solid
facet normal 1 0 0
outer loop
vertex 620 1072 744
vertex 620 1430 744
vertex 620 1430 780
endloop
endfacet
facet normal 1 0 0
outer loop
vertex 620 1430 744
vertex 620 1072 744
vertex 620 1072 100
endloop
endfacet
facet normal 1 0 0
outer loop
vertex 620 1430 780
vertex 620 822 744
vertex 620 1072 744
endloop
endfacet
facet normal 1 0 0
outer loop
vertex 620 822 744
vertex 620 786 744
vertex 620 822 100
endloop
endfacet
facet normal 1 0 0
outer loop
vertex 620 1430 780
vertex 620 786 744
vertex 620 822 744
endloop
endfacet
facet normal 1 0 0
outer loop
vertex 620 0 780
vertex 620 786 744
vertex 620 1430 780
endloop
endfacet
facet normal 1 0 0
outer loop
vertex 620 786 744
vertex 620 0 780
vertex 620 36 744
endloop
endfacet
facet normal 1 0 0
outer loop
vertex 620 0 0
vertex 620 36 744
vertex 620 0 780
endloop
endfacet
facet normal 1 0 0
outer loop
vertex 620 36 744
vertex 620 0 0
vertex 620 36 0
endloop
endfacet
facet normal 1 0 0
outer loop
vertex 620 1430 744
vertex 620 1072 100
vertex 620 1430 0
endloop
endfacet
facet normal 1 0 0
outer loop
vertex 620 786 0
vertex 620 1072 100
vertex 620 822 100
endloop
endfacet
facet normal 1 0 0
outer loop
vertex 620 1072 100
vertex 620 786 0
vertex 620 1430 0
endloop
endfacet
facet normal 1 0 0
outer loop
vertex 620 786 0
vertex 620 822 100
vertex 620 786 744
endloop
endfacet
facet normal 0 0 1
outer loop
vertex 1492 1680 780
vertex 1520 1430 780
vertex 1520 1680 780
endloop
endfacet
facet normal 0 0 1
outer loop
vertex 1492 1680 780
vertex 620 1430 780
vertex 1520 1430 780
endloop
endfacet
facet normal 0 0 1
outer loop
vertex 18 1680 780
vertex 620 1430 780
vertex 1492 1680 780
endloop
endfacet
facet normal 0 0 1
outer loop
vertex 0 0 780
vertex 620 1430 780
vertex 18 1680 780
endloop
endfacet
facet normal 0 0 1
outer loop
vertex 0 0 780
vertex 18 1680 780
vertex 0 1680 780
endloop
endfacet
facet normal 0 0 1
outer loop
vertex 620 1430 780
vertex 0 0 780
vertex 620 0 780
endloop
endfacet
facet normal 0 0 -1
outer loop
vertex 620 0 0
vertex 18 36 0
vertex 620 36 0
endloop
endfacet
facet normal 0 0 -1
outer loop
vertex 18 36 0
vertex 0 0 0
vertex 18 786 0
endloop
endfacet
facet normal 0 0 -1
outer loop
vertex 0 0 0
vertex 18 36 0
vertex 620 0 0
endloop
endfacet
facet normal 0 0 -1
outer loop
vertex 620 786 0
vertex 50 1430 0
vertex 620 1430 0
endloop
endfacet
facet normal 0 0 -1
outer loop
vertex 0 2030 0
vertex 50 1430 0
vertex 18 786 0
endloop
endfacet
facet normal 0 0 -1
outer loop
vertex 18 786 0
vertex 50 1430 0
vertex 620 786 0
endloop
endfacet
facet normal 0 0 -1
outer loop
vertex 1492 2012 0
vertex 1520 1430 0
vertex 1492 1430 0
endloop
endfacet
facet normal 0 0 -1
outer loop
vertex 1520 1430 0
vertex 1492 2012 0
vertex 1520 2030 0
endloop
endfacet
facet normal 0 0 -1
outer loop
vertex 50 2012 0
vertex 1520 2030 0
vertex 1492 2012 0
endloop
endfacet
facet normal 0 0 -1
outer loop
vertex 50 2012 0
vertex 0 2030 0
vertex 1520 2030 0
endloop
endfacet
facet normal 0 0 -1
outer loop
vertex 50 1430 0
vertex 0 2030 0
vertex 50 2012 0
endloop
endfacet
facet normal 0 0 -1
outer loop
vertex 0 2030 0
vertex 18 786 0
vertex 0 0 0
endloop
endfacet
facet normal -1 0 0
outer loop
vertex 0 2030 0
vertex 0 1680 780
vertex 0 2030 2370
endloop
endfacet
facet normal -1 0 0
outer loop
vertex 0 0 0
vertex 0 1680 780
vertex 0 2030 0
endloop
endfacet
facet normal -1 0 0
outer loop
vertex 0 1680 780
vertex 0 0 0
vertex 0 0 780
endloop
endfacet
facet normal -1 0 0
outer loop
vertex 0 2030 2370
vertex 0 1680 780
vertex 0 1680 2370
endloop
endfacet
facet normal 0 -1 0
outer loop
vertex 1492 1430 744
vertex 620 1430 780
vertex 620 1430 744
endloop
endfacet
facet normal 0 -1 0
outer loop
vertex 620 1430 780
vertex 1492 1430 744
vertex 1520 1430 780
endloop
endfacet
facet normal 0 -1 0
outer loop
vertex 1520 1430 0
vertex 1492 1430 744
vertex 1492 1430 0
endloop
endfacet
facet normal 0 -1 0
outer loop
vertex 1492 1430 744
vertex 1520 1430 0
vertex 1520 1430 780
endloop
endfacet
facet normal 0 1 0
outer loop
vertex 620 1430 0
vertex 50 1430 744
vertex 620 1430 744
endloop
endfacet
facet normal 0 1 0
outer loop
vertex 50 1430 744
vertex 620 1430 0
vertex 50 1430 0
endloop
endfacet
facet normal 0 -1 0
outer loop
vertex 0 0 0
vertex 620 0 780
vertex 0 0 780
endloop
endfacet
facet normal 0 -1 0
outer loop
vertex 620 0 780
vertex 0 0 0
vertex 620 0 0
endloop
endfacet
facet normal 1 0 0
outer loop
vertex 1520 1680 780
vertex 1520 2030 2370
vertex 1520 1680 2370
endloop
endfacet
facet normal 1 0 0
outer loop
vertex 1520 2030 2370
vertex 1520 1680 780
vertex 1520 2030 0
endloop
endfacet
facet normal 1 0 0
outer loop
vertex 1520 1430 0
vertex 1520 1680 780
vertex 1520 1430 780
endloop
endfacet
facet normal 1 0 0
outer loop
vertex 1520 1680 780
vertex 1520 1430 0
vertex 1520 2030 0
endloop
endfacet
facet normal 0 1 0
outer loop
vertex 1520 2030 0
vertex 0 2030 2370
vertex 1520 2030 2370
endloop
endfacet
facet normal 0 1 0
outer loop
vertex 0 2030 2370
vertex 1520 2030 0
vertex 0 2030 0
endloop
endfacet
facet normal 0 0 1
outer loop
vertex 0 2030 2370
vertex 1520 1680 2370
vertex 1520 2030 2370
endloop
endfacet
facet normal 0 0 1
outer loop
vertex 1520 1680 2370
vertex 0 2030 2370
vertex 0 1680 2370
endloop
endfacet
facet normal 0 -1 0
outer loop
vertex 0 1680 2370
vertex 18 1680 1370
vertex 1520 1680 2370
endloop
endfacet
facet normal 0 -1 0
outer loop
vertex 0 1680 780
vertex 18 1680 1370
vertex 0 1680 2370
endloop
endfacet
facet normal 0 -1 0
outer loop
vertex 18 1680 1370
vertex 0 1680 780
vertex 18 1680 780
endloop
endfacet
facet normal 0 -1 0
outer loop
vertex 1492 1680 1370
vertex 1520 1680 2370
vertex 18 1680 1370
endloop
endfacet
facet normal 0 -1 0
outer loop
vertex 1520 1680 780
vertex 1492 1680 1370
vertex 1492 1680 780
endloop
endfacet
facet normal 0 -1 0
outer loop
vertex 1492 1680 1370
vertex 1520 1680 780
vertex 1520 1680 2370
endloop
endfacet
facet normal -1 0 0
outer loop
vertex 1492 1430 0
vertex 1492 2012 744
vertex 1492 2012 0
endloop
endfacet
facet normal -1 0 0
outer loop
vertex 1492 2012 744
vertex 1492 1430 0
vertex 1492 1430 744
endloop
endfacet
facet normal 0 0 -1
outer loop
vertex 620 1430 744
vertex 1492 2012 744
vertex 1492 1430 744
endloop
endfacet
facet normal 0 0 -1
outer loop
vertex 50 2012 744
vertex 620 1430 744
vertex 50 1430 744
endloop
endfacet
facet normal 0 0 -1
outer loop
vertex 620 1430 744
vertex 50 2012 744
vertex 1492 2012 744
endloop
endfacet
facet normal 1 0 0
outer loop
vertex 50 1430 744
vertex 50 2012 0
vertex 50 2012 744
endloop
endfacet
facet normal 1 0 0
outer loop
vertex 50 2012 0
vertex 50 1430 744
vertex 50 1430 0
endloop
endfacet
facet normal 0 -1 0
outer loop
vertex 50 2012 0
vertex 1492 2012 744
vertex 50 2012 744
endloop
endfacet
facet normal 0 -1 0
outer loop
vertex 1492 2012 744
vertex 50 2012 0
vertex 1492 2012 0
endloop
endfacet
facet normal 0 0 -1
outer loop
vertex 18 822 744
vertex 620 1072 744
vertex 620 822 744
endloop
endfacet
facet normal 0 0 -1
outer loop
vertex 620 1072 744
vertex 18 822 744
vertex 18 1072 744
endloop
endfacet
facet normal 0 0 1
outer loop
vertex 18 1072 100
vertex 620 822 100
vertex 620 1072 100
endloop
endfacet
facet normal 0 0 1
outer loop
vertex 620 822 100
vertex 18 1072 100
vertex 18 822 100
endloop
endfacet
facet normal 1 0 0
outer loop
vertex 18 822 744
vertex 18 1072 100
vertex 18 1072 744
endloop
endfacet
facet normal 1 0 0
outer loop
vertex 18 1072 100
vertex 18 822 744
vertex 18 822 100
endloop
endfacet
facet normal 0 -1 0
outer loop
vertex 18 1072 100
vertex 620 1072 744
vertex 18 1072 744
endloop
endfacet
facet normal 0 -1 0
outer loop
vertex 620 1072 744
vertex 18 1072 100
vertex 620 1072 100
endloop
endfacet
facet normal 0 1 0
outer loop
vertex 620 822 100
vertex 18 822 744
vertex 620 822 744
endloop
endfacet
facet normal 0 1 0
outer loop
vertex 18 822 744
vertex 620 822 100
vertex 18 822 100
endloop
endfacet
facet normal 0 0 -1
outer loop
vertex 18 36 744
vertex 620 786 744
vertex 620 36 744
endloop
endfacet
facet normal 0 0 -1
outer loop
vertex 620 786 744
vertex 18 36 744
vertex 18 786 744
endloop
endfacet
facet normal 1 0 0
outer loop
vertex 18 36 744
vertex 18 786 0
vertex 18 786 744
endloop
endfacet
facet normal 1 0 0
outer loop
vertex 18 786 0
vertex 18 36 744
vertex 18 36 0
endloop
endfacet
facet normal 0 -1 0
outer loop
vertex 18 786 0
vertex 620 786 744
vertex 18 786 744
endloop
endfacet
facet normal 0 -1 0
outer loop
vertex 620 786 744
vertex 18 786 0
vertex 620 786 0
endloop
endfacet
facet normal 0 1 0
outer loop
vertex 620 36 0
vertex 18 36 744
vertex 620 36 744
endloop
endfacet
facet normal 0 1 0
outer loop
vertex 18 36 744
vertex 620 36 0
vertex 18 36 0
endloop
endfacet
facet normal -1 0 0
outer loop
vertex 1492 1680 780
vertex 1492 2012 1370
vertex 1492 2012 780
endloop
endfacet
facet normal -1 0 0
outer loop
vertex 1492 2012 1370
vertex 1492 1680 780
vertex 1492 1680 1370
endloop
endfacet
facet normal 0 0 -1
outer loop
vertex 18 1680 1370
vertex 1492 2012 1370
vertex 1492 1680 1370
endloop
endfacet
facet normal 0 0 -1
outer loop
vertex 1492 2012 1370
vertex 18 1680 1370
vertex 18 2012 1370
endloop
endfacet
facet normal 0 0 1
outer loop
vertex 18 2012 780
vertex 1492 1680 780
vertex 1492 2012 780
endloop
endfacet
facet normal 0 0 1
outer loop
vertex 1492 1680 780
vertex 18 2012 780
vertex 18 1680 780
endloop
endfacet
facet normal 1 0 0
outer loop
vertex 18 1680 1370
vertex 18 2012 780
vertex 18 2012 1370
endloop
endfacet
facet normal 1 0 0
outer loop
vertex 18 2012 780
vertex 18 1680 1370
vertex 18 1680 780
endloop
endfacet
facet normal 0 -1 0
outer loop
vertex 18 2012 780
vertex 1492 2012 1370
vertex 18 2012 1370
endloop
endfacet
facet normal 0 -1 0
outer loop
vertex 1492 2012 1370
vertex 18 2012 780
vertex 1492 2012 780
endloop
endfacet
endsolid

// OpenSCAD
//Cabinets柜子集合


//次卧衣柜(左下角原点)
module tatami_wardrobe(){
cube([1520,600,2400]);
}

//tatami_wardrobe();


//tatami
//左下角原点
module tatami(){
cube([2790,2470,500]);

}
//tatami();

//鞋柜
module shoe(){
difference(){
cube([400,1140,2400]);
translate([0,0,2400-80-700-611])
cube([400-18,518,611]);
}
}
//shoe();

//主卧衣柜
module wardrobe(){
cube([2100,600,2770]);
}
//wardrobe();

//书柜
module bookcase(){
difference(){
union(){
cube([620,750+680,780]);
translate([0,750+680,0])
cube([1520,600,780]);
translate([0,750+680+250,780])
cube([1520,350,1590]);
}

translate([50,750+680,0])
cube([1442,600-18,780-36]);
translate([18,36+750+36,100])
cube([620-18,250,780-36-100]);
translate([18,36,0])
cube([620-18,750,780-36]);
translate([18,750+680+250,780])
cube([1510-2*18,350-18,590]);
}
}
bookcase();
